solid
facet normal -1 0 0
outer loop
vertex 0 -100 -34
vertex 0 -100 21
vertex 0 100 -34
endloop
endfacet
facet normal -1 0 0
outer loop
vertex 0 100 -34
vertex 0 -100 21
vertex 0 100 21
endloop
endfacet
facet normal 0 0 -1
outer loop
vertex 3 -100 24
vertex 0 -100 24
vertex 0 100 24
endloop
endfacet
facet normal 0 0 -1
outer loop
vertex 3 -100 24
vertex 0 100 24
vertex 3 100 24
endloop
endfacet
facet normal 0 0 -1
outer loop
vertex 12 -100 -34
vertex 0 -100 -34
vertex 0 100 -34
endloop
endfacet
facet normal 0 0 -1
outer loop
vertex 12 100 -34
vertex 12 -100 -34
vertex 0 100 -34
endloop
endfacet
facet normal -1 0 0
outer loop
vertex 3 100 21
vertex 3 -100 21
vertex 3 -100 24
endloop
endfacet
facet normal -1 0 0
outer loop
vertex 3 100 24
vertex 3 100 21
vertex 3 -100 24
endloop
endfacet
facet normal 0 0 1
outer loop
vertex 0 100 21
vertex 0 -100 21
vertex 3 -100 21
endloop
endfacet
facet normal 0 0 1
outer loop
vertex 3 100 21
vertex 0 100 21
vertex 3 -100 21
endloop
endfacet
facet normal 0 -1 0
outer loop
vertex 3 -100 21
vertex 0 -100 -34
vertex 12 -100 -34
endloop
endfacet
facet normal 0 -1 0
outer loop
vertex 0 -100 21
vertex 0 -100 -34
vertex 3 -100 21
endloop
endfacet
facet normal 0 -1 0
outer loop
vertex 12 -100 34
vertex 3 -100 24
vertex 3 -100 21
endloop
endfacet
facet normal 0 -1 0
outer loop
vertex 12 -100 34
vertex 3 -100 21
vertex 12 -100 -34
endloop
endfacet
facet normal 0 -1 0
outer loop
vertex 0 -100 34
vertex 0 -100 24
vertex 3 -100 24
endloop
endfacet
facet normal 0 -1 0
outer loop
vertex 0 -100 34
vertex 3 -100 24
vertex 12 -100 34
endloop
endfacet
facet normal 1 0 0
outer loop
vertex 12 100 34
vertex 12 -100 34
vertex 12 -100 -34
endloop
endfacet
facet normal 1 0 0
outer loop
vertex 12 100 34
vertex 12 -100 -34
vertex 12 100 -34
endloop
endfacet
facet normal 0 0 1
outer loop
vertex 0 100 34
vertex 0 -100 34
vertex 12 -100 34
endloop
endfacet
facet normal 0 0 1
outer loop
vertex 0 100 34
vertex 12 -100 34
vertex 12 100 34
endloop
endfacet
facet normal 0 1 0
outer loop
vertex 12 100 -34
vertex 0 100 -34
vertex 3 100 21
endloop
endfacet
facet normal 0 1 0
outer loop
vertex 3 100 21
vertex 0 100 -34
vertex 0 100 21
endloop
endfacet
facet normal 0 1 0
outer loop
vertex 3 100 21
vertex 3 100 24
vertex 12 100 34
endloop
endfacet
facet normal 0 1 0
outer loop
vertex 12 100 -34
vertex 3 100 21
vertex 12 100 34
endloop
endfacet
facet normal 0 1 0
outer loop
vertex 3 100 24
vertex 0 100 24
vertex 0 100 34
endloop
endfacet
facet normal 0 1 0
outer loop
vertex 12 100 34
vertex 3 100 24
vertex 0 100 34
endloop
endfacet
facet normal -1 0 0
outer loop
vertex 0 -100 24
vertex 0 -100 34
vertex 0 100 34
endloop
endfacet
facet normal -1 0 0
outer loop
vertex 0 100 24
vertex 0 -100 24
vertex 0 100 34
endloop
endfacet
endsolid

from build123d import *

# Parameters (mm, degrees)
F0_W     = 200
F0_H     = 68
F1_DEPTH = 12
F2_W     = 3
F2_H     = 3
F3_DEPTH = 32123
F4_W     = 3
F4_H     = 3
F5_DEPTH = 20


with BuildPart() as f1:
    # F0 (on Right) → F1 (new body)
    with BuildSketch(Plane.YZ):
        Rectangle(F0_W, F0_H)
    extrude(amount=F1_DEPTH)

    # F2 (on face) → F3 (cut)
    with BuildSketch(Plane.XZ.offset(100)):
        with Locations((1.5, 22.5)):
            Rectangle(F2_W, F2_H)
    extrude(amount=-F3_DEPTH, mode=Mode.SUBTRACT)

    # F4 (on face) → F5 (cut)
    with BuildSketch(Plane.XZ.offset(100)):
        with Locations((1.5, 22.5)):
            Rectangle(F4_W, F4_H)
    extrude(amount=-F5_DEPTH, mode=Mode.SUBTRACT)


solid = f1.part
